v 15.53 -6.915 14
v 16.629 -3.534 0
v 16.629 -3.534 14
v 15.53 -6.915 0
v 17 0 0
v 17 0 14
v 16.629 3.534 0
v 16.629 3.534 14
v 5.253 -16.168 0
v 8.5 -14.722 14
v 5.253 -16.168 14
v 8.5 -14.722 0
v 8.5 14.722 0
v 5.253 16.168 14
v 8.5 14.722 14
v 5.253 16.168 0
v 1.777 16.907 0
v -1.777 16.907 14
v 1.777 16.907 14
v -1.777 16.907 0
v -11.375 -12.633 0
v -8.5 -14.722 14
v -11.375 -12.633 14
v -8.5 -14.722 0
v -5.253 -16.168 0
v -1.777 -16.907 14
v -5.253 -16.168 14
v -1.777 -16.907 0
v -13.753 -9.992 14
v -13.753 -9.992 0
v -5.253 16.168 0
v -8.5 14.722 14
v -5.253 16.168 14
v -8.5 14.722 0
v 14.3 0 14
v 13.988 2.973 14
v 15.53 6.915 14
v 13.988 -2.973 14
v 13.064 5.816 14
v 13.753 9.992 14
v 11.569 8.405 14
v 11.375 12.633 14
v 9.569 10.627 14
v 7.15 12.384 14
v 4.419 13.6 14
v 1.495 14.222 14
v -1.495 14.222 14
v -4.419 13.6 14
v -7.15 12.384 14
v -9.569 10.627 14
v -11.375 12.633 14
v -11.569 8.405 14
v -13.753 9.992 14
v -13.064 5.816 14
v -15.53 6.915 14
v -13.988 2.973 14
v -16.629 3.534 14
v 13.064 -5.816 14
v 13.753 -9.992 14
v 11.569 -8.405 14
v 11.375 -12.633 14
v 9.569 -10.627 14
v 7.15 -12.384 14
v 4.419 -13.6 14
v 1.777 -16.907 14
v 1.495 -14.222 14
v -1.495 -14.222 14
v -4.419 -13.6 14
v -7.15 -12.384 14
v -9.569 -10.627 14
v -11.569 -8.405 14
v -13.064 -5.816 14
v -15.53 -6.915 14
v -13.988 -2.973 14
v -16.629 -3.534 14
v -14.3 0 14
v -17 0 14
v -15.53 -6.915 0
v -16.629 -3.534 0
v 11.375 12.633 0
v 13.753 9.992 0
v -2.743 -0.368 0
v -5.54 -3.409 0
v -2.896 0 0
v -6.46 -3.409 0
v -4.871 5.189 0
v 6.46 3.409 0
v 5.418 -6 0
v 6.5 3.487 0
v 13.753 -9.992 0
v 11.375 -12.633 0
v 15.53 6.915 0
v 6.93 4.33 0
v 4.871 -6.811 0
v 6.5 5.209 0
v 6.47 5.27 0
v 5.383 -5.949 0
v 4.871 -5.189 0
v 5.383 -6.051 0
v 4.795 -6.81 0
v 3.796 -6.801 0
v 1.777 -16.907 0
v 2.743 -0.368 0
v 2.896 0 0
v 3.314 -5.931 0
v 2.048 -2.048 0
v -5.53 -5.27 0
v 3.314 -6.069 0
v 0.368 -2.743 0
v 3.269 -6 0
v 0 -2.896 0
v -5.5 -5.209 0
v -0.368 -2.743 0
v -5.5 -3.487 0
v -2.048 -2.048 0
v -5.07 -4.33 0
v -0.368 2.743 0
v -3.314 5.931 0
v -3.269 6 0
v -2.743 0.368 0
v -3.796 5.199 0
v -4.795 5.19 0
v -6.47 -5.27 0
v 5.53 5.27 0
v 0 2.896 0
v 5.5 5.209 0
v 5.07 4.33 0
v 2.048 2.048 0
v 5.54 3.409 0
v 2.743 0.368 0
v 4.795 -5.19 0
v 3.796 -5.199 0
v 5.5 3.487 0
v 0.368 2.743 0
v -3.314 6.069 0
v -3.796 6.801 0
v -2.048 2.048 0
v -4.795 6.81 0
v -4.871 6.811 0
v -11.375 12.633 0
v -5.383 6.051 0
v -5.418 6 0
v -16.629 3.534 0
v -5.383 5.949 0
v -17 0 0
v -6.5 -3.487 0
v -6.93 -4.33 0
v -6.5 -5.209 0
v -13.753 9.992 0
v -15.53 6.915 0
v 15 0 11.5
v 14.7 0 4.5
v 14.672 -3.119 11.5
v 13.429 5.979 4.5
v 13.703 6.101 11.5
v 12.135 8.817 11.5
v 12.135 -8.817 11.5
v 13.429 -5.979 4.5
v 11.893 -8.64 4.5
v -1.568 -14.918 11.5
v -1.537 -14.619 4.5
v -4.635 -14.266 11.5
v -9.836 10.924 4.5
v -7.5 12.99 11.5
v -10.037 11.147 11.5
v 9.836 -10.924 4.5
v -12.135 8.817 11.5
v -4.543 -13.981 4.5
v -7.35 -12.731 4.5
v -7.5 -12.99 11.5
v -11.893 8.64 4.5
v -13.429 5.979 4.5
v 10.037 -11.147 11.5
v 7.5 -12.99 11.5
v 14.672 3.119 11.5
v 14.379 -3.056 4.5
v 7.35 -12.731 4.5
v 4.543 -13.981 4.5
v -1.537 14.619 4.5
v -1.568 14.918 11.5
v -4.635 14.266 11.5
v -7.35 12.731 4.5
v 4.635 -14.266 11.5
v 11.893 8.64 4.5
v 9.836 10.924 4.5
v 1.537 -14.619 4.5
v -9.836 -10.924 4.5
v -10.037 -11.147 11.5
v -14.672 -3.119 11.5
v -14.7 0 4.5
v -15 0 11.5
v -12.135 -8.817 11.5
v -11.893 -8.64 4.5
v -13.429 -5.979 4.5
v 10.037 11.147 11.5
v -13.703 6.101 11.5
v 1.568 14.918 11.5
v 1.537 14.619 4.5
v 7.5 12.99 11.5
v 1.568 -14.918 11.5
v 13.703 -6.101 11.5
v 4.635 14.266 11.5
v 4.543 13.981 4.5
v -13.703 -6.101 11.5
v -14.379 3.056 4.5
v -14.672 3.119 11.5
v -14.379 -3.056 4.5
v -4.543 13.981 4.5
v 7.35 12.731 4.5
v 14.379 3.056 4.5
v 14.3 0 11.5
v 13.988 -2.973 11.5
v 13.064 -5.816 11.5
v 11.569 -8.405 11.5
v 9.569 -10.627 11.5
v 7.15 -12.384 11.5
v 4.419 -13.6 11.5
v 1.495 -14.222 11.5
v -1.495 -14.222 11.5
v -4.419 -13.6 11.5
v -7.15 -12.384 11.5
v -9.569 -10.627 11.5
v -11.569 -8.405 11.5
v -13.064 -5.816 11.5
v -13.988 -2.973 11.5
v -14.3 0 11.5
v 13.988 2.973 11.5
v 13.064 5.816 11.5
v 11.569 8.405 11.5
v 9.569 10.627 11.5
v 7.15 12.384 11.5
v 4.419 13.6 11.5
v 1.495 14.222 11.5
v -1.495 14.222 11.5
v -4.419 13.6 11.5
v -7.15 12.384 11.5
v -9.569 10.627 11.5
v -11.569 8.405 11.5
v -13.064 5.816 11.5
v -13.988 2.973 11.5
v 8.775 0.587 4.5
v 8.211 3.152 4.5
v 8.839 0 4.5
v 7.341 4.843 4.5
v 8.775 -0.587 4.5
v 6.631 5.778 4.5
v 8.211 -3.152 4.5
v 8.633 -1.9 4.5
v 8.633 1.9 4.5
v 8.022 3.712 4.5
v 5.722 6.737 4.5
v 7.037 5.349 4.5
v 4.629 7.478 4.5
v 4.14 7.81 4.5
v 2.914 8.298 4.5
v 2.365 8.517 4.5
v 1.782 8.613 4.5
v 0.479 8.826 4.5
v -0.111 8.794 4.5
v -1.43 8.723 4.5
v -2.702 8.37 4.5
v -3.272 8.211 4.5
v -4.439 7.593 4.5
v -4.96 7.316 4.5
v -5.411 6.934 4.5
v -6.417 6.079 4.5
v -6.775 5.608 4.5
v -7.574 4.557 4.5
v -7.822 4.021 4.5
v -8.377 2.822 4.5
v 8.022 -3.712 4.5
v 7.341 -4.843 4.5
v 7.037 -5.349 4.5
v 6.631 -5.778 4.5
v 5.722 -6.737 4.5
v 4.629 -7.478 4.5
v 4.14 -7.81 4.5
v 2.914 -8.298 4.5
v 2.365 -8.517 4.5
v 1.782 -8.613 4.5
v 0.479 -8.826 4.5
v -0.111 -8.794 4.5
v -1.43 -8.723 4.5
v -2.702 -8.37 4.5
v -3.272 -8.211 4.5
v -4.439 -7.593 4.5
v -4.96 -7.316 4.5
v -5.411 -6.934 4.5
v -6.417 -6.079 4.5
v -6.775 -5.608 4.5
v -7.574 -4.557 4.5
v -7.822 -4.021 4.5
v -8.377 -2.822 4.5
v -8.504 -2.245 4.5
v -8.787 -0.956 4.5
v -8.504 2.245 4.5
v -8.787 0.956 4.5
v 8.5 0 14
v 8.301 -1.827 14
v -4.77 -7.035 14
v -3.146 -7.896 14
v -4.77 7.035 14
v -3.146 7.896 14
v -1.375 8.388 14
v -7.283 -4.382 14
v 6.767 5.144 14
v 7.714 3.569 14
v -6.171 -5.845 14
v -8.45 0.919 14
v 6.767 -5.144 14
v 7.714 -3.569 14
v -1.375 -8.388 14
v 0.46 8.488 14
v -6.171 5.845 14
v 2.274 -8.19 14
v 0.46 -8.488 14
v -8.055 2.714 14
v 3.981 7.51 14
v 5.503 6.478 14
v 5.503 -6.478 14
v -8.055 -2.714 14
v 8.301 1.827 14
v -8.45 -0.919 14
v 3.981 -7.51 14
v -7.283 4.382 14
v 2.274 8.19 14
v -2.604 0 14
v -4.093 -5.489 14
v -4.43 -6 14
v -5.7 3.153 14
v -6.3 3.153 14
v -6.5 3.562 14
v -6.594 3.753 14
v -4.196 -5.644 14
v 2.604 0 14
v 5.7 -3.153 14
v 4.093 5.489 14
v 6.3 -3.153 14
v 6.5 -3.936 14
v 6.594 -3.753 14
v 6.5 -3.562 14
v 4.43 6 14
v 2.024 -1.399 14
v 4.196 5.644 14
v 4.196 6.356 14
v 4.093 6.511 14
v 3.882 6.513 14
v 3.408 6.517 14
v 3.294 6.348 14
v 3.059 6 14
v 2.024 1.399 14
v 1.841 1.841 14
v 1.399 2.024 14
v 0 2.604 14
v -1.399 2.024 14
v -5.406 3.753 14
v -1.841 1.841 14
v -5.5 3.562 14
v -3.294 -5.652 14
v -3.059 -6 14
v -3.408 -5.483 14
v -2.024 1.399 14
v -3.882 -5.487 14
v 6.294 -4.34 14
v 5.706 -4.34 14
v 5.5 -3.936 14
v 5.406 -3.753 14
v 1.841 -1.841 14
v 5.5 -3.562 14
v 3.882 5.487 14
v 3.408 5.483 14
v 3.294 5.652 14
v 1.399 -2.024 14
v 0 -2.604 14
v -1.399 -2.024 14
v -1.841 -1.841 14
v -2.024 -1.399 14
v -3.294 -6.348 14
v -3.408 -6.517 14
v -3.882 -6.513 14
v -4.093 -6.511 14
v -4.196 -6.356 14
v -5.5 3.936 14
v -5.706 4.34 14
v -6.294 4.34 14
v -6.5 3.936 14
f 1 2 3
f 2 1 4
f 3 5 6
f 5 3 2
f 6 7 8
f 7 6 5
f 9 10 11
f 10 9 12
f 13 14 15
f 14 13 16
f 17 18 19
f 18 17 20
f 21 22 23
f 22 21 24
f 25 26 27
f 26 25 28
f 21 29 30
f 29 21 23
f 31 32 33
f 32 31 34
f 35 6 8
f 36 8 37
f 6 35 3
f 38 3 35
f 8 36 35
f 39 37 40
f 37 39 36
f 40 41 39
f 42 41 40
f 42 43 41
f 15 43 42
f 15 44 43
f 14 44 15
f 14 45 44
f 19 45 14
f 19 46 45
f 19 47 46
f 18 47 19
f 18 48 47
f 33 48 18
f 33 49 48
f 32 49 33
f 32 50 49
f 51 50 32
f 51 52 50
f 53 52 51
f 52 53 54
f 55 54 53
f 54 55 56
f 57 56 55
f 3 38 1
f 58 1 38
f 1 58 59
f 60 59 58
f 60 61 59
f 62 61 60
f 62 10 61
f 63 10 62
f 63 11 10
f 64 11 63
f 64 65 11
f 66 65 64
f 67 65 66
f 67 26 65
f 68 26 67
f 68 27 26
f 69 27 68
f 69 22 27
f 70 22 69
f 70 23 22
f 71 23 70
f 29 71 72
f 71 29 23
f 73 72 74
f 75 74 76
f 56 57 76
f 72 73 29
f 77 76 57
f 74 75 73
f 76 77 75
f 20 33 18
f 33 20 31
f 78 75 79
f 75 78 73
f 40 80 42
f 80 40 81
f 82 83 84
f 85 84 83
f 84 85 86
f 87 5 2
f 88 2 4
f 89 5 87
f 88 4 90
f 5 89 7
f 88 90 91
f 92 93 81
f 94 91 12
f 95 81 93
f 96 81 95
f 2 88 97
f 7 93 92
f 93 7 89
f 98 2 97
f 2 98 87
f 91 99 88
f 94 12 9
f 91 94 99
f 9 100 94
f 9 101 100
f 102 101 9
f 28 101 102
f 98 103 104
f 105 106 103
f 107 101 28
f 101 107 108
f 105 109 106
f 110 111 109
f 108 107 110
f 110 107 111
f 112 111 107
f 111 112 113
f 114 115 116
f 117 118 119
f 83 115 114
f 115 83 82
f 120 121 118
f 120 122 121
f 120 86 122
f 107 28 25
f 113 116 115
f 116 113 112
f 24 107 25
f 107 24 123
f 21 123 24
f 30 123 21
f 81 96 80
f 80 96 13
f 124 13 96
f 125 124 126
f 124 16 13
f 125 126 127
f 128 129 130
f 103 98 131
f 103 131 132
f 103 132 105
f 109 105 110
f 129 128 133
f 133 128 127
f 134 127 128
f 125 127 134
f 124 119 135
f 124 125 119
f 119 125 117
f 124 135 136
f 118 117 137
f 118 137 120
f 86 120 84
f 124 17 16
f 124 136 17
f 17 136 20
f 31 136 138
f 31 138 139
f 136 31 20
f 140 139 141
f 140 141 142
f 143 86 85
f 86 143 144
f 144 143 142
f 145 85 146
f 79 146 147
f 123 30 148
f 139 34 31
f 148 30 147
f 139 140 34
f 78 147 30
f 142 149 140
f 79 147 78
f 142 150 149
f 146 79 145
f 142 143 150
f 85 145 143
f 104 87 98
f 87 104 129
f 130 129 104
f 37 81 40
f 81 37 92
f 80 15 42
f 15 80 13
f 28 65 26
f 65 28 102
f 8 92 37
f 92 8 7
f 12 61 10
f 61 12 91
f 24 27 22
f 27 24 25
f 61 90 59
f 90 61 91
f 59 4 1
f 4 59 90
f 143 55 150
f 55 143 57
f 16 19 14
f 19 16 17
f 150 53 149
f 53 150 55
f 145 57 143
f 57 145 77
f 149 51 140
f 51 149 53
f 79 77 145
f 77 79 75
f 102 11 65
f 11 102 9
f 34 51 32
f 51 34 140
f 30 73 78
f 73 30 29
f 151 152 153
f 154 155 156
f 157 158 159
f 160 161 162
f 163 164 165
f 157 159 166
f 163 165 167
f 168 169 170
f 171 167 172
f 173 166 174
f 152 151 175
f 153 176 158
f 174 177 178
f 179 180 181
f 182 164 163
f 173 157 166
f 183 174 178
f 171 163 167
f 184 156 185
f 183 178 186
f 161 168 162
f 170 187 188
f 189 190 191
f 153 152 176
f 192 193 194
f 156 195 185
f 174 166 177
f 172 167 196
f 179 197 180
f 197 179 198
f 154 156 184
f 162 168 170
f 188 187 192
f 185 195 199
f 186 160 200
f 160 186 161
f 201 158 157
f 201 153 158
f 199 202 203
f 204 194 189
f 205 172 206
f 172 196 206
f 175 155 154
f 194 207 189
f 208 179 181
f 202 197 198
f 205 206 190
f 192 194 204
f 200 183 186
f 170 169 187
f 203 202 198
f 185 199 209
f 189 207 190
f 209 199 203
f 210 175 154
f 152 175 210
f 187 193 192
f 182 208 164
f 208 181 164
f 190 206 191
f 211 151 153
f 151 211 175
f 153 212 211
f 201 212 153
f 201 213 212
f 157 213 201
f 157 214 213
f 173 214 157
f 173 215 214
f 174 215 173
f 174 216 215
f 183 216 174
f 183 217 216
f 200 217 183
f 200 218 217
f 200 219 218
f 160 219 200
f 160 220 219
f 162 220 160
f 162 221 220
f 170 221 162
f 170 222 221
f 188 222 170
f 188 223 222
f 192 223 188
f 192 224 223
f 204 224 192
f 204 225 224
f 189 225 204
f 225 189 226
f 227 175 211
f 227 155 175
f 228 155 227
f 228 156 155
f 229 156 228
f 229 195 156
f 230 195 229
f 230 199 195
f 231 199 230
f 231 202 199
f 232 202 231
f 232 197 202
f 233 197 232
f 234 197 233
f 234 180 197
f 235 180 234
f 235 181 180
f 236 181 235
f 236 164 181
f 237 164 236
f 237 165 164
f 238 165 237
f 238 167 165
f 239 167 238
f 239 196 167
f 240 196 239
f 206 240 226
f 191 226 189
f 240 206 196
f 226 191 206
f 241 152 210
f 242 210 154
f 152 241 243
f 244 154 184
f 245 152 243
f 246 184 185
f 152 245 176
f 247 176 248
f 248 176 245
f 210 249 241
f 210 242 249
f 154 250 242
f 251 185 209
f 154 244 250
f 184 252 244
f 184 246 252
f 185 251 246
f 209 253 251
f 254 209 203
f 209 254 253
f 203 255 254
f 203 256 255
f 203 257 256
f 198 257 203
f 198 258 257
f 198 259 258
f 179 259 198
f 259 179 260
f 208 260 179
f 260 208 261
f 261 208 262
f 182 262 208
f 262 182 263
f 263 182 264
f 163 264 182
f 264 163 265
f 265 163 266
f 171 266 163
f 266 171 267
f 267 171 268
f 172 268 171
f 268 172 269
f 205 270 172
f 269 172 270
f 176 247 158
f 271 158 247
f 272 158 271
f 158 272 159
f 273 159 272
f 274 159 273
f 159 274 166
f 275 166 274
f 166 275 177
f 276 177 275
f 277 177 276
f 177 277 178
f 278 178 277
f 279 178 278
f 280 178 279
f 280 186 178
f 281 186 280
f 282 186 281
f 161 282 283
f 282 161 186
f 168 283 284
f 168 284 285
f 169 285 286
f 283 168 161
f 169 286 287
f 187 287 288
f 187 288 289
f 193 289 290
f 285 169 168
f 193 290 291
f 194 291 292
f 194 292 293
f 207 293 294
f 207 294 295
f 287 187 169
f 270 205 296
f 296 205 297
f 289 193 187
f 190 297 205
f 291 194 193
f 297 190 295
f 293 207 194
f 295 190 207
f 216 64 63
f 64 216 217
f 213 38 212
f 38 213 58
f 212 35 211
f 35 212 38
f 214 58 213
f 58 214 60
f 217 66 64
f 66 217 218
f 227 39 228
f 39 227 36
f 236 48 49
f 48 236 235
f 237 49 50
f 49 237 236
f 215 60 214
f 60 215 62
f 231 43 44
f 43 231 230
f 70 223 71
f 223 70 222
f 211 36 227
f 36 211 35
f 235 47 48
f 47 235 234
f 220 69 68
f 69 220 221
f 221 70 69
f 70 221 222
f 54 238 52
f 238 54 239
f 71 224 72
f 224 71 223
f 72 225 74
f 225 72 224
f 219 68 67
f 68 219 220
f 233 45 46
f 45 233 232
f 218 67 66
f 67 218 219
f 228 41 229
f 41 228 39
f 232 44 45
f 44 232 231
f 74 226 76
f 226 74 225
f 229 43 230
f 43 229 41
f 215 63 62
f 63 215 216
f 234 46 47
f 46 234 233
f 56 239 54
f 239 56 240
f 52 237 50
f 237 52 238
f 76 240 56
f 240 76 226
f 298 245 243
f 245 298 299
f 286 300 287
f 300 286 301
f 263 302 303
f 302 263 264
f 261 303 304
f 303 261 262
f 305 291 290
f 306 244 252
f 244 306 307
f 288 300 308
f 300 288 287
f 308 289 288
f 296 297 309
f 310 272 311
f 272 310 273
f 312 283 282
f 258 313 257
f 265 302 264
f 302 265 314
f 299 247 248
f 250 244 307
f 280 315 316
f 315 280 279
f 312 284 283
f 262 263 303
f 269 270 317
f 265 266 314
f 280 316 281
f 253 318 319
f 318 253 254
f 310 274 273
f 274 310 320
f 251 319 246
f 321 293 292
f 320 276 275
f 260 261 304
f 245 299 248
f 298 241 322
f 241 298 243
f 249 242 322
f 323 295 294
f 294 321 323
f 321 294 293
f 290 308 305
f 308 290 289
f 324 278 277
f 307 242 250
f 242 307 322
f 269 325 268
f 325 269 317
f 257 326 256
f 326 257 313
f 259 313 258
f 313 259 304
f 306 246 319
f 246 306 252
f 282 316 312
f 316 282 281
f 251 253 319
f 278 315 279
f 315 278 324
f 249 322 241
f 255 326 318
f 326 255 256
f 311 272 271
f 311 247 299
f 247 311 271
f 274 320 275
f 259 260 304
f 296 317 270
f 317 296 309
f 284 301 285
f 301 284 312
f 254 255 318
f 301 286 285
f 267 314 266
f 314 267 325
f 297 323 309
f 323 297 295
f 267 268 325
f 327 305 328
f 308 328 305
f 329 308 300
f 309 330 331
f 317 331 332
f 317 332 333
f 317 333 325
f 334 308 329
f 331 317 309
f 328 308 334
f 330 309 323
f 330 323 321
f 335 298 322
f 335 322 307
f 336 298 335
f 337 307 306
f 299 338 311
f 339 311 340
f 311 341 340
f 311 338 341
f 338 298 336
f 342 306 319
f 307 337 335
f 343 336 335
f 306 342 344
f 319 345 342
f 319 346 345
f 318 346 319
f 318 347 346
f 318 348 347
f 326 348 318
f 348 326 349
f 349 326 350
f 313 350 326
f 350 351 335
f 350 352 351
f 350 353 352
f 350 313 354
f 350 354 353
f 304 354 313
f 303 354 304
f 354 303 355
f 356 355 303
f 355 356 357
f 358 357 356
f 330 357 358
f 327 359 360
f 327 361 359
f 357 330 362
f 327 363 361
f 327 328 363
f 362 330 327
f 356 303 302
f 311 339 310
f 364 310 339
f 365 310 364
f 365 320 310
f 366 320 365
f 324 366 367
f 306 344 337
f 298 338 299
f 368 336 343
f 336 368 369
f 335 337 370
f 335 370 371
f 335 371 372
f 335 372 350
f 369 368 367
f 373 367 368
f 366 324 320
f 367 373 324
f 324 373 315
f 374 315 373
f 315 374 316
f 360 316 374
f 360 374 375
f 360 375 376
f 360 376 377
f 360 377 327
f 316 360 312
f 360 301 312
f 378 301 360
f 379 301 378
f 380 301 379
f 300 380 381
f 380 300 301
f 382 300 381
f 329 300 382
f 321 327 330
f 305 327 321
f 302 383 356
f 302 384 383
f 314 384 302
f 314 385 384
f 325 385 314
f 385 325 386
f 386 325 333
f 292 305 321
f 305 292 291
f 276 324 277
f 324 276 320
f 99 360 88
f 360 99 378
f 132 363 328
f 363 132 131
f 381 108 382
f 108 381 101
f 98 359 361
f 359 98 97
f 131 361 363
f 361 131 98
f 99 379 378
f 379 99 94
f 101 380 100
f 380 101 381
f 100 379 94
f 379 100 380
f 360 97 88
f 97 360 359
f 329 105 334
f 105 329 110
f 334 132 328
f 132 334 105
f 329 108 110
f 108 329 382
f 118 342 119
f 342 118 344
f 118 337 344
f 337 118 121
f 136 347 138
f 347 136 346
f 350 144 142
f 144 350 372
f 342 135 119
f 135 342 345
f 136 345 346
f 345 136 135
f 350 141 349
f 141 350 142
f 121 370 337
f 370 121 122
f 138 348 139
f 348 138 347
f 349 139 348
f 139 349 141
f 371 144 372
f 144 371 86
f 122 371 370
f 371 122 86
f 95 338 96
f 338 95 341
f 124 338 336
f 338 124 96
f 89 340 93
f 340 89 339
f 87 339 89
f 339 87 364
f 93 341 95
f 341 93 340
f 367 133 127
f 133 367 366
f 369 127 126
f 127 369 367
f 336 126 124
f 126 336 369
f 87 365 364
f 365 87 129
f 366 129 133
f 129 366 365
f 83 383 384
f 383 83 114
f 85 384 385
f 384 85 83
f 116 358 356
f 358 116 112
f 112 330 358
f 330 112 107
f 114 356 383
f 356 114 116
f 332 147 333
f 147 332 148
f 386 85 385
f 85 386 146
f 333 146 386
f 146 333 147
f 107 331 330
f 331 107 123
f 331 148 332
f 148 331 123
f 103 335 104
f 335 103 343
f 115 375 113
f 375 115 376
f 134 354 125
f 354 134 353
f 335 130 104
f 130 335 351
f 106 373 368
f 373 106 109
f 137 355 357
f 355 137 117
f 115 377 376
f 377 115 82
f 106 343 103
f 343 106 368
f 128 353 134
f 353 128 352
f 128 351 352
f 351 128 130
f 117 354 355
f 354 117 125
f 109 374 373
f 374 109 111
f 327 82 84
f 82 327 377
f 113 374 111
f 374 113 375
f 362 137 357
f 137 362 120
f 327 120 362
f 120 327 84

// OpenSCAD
up = 1;
down = 0;

function optimal_facets(rad) = max(6,2*round(round(3+2*rad)/2));

module stopper(outer, inner, thickness, angle, trad) {
  off = 6;
  difference() {
    union() {
      difference() {
        cylinder(r=outer,h=thickness,center=true); // CAP
        translate([0,0,-1])
         cylinder(r2=inner+2.2,r1=inner+2.5, h=thickness/2,center=true);
        translate([0,0,-5.5])
         cylinder(r2=inner+1.8,r1=inner+1.8, h=thickness/4,center=true);
      }
      cylinder(r2=inner-3.5,r1=inner-4,h=thickness,center=true); // Stopper
    }
    translate([0,off,-0.5])
        rotate([0,angle,0])
        cone(trad,0.5,down,thickness+10);
    translate([0,-off,-0.5])
        rotate([0,-angle,0])
         cone(trad,0.5,down,thickness+10);
    translate([off,0,-0.5])
        rotate([angle,0,0])
         cone(trad,0.5,down,thickness+10);
    translate([-off,0,-0.5])
        rotate([-angle,0,0])
         cone(trad,0.5,down,thickness+10);
     cone(2.5,0.5,down,thickness+10);

  } // Subtract tubes from cap+stopper
//
}

module cone(radius,delta,updown,len) {
   rad1 = radius;
   rad2 = radius + delta;
   facets = optimal_facets(radius);
   if (updown == 1)
	  cylinder(r1=rad2,r2=rad1,h=len,center=true,$fn=facets);
   else
     cylinder(r2=rad2,r1=rad1,h=len,center=true,$fn=facets);
}

translate([0,0,7])
  rotate([180,0,0])
    stopper(17,12.5,14,30,0.5);
